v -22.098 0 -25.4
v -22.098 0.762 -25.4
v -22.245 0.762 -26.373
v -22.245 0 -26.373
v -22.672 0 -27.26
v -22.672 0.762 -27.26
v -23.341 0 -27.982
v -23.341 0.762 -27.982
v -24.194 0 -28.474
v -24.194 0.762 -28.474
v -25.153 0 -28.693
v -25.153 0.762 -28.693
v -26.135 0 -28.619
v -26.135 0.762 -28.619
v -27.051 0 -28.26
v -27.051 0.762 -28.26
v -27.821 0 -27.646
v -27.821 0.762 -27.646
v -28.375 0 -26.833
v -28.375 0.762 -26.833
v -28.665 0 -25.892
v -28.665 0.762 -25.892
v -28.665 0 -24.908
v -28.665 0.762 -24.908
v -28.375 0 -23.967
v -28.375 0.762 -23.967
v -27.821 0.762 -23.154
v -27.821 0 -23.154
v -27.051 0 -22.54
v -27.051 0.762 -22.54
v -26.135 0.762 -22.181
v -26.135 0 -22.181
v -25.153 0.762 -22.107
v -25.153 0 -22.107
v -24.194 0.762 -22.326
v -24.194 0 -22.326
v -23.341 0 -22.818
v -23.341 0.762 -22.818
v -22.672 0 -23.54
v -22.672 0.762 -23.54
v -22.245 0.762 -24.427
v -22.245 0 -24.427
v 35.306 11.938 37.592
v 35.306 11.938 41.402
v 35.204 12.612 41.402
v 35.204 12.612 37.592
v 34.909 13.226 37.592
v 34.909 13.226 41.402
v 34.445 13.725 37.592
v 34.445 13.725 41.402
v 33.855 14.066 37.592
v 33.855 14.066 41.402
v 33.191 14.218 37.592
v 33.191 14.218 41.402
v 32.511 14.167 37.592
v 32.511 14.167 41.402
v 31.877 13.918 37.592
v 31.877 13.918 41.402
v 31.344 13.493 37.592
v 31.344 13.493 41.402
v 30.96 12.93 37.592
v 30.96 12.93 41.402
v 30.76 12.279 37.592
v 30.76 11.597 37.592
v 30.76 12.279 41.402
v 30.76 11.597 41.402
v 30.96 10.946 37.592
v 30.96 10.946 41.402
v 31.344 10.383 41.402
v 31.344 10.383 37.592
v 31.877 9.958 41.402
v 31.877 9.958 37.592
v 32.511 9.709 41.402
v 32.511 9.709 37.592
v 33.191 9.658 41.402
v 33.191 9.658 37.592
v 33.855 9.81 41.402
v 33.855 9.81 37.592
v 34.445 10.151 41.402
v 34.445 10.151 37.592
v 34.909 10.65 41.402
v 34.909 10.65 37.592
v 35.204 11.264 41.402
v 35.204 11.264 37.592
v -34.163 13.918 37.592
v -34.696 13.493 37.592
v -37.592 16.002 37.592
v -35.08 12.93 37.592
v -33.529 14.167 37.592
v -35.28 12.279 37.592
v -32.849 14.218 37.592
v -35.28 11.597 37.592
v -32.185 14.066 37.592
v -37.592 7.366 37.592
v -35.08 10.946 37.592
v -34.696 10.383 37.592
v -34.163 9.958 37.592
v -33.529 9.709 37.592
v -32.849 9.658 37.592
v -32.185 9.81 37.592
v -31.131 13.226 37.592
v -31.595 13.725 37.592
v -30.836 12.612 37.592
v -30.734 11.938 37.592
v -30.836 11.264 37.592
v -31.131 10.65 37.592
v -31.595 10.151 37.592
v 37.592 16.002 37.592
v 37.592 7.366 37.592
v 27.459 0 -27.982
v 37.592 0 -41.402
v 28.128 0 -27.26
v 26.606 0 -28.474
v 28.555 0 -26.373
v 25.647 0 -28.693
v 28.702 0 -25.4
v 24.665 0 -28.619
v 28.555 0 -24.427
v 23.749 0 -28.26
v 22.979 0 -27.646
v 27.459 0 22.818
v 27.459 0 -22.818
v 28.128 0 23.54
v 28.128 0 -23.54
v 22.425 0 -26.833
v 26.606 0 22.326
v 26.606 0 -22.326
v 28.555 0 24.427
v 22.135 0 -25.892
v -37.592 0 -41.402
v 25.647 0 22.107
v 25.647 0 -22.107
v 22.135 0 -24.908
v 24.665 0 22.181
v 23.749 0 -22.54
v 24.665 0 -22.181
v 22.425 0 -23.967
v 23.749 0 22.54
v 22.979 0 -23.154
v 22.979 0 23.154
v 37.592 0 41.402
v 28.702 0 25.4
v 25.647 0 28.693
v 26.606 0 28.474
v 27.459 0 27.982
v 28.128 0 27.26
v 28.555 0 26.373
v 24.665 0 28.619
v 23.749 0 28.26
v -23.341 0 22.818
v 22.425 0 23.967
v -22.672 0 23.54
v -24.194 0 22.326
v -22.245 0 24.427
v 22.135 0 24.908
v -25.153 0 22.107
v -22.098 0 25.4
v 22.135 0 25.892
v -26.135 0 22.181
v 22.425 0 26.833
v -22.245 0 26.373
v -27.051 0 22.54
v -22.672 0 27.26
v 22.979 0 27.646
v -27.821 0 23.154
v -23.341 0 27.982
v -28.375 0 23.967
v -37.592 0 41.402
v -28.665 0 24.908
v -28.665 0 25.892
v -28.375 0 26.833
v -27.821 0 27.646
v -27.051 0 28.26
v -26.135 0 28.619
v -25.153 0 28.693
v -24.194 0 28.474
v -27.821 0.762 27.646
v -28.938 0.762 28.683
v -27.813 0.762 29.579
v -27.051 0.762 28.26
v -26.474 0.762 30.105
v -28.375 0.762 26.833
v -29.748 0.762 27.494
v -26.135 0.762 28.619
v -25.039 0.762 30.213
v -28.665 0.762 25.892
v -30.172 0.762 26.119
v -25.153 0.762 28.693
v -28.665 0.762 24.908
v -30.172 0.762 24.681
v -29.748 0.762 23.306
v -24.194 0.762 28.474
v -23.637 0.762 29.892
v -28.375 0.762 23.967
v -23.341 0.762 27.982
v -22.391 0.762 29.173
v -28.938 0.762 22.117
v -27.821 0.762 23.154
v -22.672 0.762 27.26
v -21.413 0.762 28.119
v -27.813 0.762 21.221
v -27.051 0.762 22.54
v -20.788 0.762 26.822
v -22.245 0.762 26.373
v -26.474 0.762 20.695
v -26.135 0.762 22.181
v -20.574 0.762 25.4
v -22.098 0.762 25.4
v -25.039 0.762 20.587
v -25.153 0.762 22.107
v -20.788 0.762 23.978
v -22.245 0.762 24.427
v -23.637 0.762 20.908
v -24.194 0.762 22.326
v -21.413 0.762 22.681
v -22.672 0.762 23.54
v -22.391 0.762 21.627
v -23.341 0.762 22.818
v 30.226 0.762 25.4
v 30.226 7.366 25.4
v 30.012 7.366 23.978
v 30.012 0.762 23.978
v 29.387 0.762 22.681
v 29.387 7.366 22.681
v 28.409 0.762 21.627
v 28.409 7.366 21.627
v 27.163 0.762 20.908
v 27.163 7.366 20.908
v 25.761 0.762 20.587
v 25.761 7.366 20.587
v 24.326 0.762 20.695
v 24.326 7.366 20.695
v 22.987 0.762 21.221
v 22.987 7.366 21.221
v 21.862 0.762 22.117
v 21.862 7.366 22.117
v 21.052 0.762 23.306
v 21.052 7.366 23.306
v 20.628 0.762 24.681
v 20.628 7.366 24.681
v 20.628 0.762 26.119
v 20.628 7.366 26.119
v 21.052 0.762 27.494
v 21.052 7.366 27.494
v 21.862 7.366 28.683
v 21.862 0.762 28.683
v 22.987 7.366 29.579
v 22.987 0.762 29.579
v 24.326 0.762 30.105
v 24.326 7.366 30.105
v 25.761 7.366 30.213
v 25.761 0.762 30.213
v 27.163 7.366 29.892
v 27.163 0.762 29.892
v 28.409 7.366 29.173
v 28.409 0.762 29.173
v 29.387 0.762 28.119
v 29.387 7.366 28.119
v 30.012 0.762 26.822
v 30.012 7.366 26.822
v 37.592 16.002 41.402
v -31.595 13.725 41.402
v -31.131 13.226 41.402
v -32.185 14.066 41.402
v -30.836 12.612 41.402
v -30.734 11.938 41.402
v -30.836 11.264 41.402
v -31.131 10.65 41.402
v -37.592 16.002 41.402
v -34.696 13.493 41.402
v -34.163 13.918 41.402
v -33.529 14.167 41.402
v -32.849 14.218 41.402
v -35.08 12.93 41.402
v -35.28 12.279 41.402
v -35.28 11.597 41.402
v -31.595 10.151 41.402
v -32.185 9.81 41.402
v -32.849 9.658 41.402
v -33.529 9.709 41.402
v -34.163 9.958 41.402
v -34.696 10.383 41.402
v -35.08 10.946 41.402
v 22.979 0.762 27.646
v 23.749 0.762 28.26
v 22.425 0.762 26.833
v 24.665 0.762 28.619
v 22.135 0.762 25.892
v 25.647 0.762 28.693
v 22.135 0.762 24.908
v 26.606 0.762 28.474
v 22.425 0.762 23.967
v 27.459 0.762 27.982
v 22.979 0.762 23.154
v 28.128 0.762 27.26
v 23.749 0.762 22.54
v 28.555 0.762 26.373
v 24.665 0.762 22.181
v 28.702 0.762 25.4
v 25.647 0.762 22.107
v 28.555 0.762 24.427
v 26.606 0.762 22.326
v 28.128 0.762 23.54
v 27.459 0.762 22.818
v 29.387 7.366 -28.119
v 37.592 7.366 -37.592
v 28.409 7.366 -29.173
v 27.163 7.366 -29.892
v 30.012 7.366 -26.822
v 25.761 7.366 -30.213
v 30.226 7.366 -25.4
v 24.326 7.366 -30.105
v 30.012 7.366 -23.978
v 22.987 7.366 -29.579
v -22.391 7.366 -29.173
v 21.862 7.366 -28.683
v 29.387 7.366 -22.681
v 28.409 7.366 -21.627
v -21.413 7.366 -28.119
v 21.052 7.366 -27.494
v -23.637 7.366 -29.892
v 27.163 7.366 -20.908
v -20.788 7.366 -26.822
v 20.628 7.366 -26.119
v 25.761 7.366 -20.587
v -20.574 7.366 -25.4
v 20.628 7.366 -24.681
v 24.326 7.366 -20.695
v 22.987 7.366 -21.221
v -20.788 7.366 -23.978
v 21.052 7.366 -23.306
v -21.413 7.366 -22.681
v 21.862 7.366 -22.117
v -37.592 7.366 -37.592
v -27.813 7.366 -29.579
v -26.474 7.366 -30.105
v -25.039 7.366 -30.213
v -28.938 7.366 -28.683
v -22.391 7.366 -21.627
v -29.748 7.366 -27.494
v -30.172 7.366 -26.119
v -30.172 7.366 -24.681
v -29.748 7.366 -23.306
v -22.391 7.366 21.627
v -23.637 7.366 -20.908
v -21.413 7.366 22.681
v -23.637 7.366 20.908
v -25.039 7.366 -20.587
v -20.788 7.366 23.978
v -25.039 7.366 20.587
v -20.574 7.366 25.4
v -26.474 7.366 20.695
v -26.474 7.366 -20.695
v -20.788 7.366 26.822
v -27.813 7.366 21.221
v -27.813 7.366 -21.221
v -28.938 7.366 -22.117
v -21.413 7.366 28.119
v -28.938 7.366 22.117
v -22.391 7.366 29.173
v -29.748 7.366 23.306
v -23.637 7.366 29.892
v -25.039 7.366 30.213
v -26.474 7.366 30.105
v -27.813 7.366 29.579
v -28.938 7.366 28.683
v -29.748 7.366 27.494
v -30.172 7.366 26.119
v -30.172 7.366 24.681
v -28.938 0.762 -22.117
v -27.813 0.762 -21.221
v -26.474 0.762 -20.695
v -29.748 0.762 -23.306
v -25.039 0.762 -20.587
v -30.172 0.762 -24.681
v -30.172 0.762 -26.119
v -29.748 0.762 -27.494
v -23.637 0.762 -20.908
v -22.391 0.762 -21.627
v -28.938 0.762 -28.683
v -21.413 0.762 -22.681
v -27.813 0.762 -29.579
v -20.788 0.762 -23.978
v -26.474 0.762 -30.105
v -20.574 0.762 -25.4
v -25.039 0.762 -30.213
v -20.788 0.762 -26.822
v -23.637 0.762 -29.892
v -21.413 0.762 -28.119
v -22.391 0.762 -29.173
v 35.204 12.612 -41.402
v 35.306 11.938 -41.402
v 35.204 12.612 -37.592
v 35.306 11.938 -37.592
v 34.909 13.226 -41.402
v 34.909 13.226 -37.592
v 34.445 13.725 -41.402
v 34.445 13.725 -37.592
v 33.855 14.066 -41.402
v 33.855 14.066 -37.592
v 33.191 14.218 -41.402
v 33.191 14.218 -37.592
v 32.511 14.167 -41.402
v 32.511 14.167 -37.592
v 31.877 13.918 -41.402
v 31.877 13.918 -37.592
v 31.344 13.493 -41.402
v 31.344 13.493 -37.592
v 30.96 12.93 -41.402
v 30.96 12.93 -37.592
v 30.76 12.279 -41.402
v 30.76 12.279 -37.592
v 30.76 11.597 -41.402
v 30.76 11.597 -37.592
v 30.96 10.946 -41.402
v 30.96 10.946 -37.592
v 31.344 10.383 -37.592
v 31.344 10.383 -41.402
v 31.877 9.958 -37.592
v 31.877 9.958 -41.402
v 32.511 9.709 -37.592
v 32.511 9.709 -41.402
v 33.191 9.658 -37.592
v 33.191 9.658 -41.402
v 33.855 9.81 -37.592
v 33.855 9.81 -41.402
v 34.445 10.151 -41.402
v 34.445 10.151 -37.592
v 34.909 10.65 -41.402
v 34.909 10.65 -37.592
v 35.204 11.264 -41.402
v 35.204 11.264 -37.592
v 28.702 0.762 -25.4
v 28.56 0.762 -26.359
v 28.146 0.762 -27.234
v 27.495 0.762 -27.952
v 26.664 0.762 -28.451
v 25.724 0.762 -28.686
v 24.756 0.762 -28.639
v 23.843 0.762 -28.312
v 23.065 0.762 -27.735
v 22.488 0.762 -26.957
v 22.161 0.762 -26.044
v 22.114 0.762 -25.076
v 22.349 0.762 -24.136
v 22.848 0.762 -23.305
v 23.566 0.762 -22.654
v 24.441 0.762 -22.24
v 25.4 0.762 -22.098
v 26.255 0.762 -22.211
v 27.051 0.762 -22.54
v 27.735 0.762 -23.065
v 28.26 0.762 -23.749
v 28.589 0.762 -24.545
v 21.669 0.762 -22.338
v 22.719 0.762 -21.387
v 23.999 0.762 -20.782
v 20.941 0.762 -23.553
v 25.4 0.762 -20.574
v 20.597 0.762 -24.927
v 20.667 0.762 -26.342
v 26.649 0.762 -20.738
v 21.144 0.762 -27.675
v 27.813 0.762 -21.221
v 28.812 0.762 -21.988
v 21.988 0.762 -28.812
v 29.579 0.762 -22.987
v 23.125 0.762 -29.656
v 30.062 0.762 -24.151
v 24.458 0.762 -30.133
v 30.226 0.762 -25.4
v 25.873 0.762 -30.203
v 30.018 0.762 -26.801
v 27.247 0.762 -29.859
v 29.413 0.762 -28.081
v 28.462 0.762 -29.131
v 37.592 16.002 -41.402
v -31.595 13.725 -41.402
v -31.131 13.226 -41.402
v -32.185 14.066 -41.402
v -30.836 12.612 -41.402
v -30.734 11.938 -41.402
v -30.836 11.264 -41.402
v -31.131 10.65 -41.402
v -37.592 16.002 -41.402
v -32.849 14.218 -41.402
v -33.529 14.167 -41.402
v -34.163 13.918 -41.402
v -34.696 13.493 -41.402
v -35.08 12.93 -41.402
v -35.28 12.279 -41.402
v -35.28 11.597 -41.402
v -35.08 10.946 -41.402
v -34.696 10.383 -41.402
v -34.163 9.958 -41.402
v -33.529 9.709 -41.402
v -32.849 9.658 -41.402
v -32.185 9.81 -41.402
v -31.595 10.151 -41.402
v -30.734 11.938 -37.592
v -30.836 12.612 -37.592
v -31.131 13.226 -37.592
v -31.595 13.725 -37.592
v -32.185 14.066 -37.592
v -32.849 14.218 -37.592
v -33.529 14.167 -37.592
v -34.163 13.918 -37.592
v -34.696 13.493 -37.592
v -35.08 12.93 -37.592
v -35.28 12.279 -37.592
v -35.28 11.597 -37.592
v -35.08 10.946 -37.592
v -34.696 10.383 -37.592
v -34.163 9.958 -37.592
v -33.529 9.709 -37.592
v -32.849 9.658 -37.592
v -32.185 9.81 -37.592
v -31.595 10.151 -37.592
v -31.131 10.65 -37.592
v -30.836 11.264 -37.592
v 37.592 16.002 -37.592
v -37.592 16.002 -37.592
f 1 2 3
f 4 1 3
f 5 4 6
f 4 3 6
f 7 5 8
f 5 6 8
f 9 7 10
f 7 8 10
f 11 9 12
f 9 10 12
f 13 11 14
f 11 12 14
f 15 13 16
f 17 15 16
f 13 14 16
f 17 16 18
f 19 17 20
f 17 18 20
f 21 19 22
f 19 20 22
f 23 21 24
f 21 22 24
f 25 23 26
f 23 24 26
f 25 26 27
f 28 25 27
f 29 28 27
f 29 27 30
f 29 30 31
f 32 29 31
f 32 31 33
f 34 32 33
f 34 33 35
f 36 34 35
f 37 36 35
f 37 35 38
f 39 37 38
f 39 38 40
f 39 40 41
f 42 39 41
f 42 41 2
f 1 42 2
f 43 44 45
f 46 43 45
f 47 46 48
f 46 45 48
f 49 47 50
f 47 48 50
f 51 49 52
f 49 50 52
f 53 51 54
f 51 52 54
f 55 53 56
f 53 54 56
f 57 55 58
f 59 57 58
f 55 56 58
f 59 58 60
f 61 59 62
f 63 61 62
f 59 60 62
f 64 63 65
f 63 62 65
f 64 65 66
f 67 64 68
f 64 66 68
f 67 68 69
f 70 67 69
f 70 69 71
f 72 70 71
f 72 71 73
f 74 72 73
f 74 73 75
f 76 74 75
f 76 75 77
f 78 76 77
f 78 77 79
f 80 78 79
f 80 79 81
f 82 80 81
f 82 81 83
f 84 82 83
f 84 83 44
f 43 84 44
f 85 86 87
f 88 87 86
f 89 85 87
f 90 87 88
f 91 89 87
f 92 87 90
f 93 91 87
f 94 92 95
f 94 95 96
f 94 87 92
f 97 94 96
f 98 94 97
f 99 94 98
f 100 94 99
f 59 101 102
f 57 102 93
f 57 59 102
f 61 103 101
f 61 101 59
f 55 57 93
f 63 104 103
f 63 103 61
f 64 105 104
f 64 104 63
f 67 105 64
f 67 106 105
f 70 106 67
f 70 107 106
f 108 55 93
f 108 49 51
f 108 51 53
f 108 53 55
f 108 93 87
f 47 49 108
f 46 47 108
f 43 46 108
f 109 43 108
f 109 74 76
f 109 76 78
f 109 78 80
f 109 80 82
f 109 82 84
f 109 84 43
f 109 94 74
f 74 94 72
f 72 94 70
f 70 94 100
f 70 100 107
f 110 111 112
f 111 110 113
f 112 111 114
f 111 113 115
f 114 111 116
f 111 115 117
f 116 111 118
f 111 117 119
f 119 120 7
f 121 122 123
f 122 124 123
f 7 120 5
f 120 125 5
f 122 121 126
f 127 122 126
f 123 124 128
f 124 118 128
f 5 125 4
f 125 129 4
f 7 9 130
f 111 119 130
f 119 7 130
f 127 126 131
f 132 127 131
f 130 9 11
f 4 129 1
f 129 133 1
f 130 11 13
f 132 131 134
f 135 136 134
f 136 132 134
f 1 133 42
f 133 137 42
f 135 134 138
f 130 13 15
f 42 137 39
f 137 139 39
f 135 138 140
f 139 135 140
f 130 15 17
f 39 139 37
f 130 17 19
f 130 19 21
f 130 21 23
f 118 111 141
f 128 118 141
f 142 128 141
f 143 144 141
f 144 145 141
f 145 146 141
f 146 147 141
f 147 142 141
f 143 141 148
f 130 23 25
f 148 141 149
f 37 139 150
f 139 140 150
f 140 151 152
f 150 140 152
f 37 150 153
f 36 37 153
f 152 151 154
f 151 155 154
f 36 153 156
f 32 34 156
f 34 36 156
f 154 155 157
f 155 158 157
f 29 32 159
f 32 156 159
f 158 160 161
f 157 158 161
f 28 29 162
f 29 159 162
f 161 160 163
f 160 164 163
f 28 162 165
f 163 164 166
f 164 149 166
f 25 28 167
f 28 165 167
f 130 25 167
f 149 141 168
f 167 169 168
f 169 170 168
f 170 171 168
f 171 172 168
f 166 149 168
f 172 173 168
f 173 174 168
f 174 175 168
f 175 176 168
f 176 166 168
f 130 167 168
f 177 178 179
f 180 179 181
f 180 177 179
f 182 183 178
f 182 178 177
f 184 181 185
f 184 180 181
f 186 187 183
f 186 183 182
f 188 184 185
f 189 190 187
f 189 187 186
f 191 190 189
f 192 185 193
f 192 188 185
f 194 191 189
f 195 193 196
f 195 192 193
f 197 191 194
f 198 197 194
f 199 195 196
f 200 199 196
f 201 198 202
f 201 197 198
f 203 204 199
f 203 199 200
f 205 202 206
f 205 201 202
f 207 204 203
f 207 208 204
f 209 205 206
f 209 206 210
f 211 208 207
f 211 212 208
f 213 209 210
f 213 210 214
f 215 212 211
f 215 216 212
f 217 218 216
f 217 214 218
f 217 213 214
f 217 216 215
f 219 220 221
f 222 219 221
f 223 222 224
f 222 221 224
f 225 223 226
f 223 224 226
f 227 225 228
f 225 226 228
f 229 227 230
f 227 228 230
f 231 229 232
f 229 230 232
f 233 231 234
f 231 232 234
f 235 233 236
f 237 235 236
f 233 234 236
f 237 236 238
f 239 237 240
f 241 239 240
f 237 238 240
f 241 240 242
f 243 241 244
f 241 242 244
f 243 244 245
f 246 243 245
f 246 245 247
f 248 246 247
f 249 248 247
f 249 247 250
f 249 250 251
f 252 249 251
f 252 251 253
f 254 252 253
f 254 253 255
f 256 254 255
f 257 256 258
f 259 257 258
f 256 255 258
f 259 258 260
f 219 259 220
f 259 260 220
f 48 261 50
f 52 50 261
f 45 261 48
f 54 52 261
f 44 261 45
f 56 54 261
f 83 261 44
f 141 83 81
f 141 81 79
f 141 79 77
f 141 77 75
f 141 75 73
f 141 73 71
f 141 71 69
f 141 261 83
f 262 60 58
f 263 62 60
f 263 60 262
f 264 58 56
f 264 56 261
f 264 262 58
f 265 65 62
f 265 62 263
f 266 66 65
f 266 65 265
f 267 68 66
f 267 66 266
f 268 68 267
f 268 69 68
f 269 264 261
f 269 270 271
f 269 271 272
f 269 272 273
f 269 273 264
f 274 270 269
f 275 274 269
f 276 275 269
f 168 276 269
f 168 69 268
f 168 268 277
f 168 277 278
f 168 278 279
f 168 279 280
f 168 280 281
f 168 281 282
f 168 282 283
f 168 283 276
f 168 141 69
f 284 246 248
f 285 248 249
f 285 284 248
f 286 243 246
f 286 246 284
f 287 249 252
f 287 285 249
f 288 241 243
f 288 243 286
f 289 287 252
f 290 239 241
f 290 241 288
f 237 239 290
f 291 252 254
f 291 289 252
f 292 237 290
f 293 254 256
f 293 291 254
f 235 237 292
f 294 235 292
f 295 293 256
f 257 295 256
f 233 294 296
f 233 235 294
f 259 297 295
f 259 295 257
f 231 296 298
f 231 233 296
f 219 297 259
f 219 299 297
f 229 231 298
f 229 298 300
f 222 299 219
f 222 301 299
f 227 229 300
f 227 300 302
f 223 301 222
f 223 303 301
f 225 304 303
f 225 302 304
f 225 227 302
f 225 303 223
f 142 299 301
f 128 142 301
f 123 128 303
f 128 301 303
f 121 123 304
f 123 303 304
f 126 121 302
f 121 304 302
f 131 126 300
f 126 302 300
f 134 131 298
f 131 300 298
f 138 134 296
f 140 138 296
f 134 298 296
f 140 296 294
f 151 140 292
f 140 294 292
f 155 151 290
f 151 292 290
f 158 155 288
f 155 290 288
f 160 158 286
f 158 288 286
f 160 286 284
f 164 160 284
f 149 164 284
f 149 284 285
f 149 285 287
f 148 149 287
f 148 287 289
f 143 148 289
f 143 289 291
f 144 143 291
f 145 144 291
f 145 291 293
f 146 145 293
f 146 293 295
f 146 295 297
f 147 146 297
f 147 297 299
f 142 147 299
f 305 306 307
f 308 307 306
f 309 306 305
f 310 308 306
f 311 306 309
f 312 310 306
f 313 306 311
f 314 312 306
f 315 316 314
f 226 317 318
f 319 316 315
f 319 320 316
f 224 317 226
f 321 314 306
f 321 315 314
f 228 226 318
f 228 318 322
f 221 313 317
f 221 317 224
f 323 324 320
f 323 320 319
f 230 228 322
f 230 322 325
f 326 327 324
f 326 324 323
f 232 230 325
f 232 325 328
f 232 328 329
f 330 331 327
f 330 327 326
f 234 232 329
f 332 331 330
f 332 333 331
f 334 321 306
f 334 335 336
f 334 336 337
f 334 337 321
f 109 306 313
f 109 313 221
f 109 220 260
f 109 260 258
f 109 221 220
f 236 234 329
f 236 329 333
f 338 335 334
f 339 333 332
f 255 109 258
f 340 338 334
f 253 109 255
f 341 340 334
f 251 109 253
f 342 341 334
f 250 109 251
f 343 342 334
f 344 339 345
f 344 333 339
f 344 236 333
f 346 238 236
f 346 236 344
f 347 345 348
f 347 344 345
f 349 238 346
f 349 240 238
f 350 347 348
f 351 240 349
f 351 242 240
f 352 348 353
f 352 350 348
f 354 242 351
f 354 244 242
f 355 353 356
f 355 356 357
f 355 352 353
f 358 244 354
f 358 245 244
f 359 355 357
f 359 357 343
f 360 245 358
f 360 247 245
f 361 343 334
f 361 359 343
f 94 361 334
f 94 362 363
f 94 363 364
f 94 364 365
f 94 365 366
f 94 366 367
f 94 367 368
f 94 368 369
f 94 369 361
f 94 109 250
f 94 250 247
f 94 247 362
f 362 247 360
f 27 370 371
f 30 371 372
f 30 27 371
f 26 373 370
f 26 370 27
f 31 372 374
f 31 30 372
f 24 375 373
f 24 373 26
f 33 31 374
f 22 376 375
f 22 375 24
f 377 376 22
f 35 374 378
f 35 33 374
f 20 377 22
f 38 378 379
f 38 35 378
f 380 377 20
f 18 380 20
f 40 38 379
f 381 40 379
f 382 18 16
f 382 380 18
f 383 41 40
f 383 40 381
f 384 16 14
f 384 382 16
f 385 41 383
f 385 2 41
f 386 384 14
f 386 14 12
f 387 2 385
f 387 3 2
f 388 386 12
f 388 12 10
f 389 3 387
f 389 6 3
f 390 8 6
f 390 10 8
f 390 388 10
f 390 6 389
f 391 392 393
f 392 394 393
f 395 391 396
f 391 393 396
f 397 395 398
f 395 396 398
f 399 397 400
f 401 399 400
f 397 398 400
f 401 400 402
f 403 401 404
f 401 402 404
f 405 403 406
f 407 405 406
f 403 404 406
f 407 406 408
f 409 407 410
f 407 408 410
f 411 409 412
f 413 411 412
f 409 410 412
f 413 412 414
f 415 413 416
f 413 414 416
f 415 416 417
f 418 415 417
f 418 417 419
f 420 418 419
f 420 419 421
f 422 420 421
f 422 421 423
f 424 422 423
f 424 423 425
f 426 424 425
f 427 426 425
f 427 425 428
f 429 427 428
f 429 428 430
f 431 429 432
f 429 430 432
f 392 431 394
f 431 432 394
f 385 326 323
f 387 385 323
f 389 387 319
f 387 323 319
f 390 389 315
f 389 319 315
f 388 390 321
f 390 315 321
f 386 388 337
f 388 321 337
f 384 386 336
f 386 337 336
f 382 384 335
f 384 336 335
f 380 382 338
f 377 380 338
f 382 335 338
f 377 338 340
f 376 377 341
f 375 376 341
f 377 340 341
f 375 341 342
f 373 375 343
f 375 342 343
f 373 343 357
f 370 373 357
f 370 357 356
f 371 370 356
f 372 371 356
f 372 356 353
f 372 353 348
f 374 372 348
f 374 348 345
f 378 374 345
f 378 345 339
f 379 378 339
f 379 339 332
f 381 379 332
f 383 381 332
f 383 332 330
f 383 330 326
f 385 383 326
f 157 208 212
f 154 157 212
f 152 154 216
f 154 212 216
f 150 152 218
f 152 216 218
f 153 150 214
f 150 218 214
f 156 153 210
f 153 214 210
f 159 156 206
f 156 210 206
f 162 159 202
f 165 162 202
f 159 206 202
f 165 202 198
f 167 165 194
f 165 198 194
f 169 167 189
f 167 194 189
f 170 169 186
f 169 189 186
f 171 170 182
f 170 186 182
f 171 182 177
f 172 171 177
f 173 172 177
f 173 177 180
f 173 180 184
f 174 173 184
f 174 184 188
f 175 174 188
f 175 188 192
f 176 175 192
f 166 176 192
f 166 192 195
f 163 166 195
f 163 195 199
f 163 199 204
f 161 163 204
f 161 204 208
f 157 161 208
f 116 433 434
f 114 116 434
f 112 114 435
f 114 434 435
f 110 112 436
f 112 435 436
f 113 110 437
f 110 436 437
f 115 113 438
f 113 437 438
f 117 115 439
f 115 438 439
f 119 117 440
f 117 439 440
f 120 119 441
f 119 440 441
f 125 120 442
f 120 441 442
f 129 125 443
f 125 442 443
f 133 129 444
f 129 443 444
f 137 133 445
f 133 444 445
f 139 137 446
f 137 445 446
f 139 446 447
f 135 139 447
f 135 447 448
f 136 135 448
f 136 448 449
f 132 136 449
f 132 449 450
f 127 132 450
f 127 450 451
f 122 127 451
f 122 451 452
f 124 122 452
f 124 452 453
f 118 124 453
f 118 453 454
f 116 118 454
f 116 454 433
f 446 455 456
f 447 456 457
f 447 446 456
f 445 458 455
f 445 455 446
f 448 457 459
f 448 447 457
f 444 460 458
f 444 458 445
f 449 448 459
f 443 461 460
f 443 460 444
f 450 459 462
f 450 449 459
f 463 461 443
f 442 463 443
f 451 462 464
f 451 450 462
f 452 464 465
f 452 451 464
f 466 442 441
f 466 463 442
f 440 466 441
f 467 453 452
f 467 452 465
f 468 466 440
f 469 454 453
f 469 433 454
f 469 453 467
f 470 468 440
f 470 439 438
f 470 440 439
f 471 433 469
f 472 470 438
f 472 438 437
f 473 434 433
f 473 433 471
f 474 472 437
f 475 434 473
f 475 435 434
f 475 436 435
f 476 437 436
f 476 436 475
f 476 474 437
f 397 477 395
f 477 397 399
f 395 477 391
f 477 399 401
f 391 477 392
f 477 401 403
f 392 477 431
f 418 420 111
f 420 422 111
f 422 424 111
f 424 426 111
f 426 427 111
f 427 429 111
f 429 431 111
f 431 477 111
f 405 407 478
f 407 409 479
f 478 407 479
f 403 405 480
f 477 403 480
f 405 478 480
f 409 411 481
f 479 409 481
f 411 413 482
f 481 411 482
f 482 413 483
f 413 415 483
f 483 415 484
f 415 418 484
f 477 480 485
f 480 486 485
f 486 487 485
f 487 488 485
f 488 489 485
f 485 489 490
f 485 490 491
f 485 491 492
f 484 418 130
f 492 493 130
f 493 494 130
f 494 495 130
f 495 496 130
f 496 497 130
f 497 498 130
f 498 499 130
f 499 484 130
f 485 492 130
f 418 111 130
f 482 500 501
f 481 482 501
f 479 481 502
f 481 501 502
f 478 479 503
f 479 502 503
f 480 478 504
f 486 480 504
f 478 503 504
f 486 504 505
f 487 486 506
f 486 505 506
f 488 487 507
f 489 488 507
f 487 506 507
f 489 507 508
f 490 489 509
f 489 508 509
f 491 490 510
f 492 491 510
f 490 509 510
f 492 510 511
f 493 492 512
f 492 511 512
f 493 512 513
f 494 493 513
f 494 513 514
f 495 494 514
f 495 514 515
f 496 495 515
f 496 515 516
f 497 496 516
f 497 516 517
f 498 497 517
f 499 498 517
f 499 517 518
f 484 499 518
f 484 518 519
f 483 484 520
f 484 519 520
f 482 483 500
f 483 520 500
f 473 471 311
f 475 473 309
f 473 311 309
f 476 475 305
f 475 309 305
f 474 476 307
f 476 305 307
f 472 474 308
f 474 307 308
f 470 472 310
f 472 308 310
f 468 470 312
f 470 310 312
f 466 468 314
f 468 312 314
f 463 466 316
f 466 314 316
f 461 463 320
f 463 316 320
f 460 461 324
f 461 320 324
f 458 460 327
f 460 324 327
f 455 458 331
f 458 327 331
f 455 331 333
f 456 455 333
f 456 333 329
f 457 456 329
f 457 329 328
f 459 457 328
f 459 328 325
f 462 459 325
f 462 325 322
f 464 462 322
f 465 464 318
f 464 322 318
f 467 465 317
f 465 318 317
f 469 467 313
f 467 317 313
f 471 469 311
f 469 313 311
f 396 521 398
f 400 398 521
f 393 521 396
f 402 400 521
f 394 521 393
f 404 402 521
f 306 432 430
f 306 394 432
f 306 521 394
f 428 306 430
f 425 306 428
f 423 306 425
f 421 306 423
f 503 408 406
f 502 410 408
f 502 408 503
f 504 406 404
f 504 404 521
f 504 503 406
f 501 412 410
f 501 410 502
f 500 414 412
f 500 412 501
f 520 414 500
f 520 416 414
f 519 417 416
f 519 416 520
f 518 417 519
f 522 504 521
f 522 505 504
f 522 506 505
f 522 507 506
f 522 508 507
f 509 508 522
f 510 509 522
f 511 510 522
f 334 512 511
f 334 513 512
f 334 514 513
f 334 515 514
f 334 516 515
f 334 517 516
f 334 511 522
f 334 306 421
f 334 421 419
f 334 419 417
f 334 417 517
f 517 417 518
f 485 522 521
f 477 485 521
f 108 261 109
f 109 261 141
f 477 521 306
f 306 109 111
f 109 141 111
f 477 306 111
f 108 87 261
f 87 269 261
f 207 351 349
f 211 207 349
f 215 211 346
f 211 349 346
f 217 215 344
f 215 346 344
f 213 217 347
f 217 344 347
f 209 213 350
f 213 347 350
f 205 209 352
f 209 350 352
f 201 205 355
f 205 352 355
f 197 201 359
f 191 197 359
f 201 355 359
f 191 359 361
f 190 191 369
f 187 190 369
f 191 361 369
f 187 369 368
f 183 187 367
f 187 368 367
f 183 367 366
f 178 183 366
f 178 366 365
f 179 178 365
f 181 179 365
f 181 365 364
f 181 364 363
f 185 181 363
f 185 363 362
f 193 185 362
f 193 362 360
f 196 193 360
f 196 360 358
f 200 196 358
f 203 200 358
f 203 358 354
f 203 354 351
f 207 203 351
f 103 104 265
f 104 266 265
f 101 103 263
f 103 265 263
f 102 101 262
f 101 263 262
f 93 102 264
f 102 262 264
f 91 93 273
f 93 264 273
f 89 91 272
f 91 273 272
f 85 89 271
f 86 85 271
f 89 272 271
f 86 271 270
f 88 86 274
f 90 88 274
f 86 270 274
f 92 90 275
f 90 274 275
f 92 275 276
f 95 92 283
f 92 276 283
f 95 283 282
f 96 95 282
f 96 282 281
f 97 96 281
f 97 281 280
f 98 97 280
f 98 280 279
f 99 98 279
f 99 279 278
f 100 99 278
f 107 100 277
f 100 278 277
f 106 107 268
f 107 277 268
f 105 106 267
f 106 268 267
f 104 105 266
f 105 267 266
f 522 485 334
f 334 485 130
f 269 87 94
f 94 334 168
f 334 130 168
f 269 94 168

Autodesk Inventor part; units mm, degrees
ref_plane "YZ Plane" through (0, 0, 0) normal (1, 0, 0) x (0, 1, 0)
ref_plane "XZ Plane" through (0, 0, 0) normal (0, 1, 0) x (-1, 0, 0)
ref_plane "XY Plane" through (0, 0, 0) normal (0, 0, 1) x (1, 0, 0)
sketch "Sketch1" plane through (0, 0, 0) normal (0, 1, 0) x (-1, 0, 0)
  line L0 (37.592, 37.592) -> (-37.592, 37.592)
  line L1 (-37.592, 37.592) -> (-37.592, -37.592)
  line L2 (-37.592, -37.592) -> (37.592, -37.592)
  line L3 (37.592, -37.592) -> (37.592, 37.592)
  line L4 (48.9249, 50.7063) -> (48.9249, -4.5387)
  line L5 (37.592, 0) -> (0, 0)
  line L6 (0, 0) -> (0, -37.592)
  point P0 (0, 0)
  dimension "d0" = 75.184
  dimension "d1" = 75.184
extrude "Extrusion1" add sketch "Sketch1" along normal blind 7.366
sketch "Sketch6" plane through (0, 7.366, 0) normal (0, 1, 0) x (1, 0, 0)
  line L0 (0, 0) -> (0, 25.4)
  line L1 (0, 25.4) -> (-25.4, 25.4)
  line L2 (-25.4, 25.4) -> (-25.4, -25.4)
  line L3 (-25.4, -25.4) -> (25.4, -25.4)
  line L4 (25.4, -25.4) -> (25.4, 25.4)
  circle A0 centre (25.4, 25.4) radius 3.302
  circle A1 centre (25.4, 25.4) radius 4.826
  circle A2 centre (25.4, -25.4) radius 3.302
  circle A3 centre (25.4, -25.4) radius 4.826
  circle A4 centre (-25.4, -25.4) radius 3.302
  circle A5 centre (-25.4, -25.4) radius 4.826
  circle A6 centre (-25.4, 25.4) radius 3.302
  circle A7 centre (-25.4, 25.4) radius 4.826
  dimension "d35" = 25.4
  dimension "d36" = 25.4
  dimension "d37" = 50.8
  dimension "d38" = 50.8
  dimension "d39" = 6.604
  dimension "d40" = 9.652
  dimension "d41" = 6.604
  dimension "d42" = 9.652
  dimension "d43" = 6.604
  dimension "d44" = 9.652
  dimension "d45" = 6.604
  dimension "d46" = 9.652
sketch "Sketch2" plane through (0, 7.366, 0) normal (0, 1, 0) x (1, 0, 0)
  line L0 (0, 0) -> (0, 12.7)
  line L1 (0, 12.7) -> (-12.7, 12.7)
  line L2 (-12.7, 12.7) -> (12.7, 12.7)
  line L3 (12.7, 12.7) -> (12.7, -12.7)
  line L4 (12.7, -12.7) -> (-12.7, -12.7)
  circle A0 centre (-12.7, -12.7) radius 3.302
  circle A1 centre (-12.7, -12.7) radius 4.826
  circle A2 centre (-12.7, 12.7) radius 3.302
  circle A3 centre (-12.7, 12.7) radius 4.826
  circle A4 centre (12.7, -12.7) radius 3.302
  circle A5 centre (12.7, -12.7) radius 4.826
  circle A6 centre (12.7, 12.7) radius 3.302
  circle A7 centre (12.7, 12.7) radius 4.826
  dimension "d4" = 12.7
  dimension "d5" = 12.7
  dimension "d6" = 25.4
  dimension "d7" = 25.4
  dimension "d8" = 25.4
  dimension "d9" = 6.604
  dimension "d10" = 9.652
  dimension "d11" = 6.604
  dimension "d12" = 9.652
  dimension "d13" = 6.604
  dimension "d14" = 9.652
  dimension "d15" = 6.604
  dimension "d16" = 9.652
sketch "Sketch3" plane through (-37.592, 0, 37.592) normal (0, 0, 1) x (1, 0, 0)
  point P0 (37.592, 0)
sketch "Sketch4" plane through (0, 0, 0) normal (0, -1, 0) x (1, 0, 0)
  line L0 (-37.592, 37.592) -> (38.608, 37.592)
  line L1 (38.608, 37.592) -> (38.608, 41.402)
  line L2 (38.608, 41.402) -> (-37.592, 41.402)
  line L3 (-37.592, 41.402) -> (-37.592, 37.592)
  line L4 (37.592, -37.592) -> (-37.592, -37.592) projected
  line L5 (-37.592, -37.592) -> (38.608, -37.592)
  line L6 (38.608, -37.592) -> (38.608, -41.402)
  line L7 (38.608, -41.402) -> (-37.592, -41.402)
  line L8 (-37.592, -41.402) -> (-37.592, -37.592)
  line L9 (37.592, 37.592) -> (37.592, 41.402)
  line L10 (37.592, -37.592) -> (37.592, -41.402)
  point P0 (0, 0)
  point P1 (38.1, -38.1)
  dimension "d21" = 3.81
  dimension "d22" = 3.81
extrude "Extrusion4" add sketch "Sketch4" against normal blind 16.002 contours L3 L2 L9 L0 | L10 L7 L8 L4
sketch "Sketch5" plane through (-37.592, 0, 41.402) normal (0, 0, 1) x (1, 0, 0)
  line L0 (0, 7.366) -> (75.184, 7.366) projected
  line L1 (75.184, 7.366) -> (70.612, 7.366)
  line L2 (70.612, 7.366) -> (70.612, 11.938)
  line L3 (0, 7.366) -> (4.572, 7.366)
  line L4 (4.572, 7.366) -> (4.572, 11.938)
  circle A0 centre (4.572, 11.938) radius 2.286
  circle A1 centre (70.612, 11.938) radius 2.286
  point P0 (37.592, 0)
  dimension "d25" = 4.572
  dimension "d26" = 4.572
  dimension "d27" = 4.572
  dimension "d51" = 4.572
  dimension "d52" = 4.572
extrude "Extrusion5" cut sketch "Sketch6" against normal blind 25.4 contours A0 | A6 L2 L1 | L1 L2 A6 | A4 L3 L2 | L2 L3 A4 | A2 L4 L3 | L3 L4 A2
extrude "Extrusion6" cut sketch "Sketch6" against normal blind 6.604 contours A7 L2 A6 L1 | L1 A6 L2 A7 | A0 | A1 | A3 L4 A2 L3 | L3 A2 L4 A3 | A5 L3 A4 L2 | L2 A4 L3 A5 | A6 L2 L1 | L1 L2 A6 | A4 L3 L2 | L2 L3 A4 | A2 L4 L3 | L3 L4 A2
extrude "Extrusion7" cut sketch "Sketch5" against normal blind 127
properties part number "Voicecoil_to_PY004_Coupler"
